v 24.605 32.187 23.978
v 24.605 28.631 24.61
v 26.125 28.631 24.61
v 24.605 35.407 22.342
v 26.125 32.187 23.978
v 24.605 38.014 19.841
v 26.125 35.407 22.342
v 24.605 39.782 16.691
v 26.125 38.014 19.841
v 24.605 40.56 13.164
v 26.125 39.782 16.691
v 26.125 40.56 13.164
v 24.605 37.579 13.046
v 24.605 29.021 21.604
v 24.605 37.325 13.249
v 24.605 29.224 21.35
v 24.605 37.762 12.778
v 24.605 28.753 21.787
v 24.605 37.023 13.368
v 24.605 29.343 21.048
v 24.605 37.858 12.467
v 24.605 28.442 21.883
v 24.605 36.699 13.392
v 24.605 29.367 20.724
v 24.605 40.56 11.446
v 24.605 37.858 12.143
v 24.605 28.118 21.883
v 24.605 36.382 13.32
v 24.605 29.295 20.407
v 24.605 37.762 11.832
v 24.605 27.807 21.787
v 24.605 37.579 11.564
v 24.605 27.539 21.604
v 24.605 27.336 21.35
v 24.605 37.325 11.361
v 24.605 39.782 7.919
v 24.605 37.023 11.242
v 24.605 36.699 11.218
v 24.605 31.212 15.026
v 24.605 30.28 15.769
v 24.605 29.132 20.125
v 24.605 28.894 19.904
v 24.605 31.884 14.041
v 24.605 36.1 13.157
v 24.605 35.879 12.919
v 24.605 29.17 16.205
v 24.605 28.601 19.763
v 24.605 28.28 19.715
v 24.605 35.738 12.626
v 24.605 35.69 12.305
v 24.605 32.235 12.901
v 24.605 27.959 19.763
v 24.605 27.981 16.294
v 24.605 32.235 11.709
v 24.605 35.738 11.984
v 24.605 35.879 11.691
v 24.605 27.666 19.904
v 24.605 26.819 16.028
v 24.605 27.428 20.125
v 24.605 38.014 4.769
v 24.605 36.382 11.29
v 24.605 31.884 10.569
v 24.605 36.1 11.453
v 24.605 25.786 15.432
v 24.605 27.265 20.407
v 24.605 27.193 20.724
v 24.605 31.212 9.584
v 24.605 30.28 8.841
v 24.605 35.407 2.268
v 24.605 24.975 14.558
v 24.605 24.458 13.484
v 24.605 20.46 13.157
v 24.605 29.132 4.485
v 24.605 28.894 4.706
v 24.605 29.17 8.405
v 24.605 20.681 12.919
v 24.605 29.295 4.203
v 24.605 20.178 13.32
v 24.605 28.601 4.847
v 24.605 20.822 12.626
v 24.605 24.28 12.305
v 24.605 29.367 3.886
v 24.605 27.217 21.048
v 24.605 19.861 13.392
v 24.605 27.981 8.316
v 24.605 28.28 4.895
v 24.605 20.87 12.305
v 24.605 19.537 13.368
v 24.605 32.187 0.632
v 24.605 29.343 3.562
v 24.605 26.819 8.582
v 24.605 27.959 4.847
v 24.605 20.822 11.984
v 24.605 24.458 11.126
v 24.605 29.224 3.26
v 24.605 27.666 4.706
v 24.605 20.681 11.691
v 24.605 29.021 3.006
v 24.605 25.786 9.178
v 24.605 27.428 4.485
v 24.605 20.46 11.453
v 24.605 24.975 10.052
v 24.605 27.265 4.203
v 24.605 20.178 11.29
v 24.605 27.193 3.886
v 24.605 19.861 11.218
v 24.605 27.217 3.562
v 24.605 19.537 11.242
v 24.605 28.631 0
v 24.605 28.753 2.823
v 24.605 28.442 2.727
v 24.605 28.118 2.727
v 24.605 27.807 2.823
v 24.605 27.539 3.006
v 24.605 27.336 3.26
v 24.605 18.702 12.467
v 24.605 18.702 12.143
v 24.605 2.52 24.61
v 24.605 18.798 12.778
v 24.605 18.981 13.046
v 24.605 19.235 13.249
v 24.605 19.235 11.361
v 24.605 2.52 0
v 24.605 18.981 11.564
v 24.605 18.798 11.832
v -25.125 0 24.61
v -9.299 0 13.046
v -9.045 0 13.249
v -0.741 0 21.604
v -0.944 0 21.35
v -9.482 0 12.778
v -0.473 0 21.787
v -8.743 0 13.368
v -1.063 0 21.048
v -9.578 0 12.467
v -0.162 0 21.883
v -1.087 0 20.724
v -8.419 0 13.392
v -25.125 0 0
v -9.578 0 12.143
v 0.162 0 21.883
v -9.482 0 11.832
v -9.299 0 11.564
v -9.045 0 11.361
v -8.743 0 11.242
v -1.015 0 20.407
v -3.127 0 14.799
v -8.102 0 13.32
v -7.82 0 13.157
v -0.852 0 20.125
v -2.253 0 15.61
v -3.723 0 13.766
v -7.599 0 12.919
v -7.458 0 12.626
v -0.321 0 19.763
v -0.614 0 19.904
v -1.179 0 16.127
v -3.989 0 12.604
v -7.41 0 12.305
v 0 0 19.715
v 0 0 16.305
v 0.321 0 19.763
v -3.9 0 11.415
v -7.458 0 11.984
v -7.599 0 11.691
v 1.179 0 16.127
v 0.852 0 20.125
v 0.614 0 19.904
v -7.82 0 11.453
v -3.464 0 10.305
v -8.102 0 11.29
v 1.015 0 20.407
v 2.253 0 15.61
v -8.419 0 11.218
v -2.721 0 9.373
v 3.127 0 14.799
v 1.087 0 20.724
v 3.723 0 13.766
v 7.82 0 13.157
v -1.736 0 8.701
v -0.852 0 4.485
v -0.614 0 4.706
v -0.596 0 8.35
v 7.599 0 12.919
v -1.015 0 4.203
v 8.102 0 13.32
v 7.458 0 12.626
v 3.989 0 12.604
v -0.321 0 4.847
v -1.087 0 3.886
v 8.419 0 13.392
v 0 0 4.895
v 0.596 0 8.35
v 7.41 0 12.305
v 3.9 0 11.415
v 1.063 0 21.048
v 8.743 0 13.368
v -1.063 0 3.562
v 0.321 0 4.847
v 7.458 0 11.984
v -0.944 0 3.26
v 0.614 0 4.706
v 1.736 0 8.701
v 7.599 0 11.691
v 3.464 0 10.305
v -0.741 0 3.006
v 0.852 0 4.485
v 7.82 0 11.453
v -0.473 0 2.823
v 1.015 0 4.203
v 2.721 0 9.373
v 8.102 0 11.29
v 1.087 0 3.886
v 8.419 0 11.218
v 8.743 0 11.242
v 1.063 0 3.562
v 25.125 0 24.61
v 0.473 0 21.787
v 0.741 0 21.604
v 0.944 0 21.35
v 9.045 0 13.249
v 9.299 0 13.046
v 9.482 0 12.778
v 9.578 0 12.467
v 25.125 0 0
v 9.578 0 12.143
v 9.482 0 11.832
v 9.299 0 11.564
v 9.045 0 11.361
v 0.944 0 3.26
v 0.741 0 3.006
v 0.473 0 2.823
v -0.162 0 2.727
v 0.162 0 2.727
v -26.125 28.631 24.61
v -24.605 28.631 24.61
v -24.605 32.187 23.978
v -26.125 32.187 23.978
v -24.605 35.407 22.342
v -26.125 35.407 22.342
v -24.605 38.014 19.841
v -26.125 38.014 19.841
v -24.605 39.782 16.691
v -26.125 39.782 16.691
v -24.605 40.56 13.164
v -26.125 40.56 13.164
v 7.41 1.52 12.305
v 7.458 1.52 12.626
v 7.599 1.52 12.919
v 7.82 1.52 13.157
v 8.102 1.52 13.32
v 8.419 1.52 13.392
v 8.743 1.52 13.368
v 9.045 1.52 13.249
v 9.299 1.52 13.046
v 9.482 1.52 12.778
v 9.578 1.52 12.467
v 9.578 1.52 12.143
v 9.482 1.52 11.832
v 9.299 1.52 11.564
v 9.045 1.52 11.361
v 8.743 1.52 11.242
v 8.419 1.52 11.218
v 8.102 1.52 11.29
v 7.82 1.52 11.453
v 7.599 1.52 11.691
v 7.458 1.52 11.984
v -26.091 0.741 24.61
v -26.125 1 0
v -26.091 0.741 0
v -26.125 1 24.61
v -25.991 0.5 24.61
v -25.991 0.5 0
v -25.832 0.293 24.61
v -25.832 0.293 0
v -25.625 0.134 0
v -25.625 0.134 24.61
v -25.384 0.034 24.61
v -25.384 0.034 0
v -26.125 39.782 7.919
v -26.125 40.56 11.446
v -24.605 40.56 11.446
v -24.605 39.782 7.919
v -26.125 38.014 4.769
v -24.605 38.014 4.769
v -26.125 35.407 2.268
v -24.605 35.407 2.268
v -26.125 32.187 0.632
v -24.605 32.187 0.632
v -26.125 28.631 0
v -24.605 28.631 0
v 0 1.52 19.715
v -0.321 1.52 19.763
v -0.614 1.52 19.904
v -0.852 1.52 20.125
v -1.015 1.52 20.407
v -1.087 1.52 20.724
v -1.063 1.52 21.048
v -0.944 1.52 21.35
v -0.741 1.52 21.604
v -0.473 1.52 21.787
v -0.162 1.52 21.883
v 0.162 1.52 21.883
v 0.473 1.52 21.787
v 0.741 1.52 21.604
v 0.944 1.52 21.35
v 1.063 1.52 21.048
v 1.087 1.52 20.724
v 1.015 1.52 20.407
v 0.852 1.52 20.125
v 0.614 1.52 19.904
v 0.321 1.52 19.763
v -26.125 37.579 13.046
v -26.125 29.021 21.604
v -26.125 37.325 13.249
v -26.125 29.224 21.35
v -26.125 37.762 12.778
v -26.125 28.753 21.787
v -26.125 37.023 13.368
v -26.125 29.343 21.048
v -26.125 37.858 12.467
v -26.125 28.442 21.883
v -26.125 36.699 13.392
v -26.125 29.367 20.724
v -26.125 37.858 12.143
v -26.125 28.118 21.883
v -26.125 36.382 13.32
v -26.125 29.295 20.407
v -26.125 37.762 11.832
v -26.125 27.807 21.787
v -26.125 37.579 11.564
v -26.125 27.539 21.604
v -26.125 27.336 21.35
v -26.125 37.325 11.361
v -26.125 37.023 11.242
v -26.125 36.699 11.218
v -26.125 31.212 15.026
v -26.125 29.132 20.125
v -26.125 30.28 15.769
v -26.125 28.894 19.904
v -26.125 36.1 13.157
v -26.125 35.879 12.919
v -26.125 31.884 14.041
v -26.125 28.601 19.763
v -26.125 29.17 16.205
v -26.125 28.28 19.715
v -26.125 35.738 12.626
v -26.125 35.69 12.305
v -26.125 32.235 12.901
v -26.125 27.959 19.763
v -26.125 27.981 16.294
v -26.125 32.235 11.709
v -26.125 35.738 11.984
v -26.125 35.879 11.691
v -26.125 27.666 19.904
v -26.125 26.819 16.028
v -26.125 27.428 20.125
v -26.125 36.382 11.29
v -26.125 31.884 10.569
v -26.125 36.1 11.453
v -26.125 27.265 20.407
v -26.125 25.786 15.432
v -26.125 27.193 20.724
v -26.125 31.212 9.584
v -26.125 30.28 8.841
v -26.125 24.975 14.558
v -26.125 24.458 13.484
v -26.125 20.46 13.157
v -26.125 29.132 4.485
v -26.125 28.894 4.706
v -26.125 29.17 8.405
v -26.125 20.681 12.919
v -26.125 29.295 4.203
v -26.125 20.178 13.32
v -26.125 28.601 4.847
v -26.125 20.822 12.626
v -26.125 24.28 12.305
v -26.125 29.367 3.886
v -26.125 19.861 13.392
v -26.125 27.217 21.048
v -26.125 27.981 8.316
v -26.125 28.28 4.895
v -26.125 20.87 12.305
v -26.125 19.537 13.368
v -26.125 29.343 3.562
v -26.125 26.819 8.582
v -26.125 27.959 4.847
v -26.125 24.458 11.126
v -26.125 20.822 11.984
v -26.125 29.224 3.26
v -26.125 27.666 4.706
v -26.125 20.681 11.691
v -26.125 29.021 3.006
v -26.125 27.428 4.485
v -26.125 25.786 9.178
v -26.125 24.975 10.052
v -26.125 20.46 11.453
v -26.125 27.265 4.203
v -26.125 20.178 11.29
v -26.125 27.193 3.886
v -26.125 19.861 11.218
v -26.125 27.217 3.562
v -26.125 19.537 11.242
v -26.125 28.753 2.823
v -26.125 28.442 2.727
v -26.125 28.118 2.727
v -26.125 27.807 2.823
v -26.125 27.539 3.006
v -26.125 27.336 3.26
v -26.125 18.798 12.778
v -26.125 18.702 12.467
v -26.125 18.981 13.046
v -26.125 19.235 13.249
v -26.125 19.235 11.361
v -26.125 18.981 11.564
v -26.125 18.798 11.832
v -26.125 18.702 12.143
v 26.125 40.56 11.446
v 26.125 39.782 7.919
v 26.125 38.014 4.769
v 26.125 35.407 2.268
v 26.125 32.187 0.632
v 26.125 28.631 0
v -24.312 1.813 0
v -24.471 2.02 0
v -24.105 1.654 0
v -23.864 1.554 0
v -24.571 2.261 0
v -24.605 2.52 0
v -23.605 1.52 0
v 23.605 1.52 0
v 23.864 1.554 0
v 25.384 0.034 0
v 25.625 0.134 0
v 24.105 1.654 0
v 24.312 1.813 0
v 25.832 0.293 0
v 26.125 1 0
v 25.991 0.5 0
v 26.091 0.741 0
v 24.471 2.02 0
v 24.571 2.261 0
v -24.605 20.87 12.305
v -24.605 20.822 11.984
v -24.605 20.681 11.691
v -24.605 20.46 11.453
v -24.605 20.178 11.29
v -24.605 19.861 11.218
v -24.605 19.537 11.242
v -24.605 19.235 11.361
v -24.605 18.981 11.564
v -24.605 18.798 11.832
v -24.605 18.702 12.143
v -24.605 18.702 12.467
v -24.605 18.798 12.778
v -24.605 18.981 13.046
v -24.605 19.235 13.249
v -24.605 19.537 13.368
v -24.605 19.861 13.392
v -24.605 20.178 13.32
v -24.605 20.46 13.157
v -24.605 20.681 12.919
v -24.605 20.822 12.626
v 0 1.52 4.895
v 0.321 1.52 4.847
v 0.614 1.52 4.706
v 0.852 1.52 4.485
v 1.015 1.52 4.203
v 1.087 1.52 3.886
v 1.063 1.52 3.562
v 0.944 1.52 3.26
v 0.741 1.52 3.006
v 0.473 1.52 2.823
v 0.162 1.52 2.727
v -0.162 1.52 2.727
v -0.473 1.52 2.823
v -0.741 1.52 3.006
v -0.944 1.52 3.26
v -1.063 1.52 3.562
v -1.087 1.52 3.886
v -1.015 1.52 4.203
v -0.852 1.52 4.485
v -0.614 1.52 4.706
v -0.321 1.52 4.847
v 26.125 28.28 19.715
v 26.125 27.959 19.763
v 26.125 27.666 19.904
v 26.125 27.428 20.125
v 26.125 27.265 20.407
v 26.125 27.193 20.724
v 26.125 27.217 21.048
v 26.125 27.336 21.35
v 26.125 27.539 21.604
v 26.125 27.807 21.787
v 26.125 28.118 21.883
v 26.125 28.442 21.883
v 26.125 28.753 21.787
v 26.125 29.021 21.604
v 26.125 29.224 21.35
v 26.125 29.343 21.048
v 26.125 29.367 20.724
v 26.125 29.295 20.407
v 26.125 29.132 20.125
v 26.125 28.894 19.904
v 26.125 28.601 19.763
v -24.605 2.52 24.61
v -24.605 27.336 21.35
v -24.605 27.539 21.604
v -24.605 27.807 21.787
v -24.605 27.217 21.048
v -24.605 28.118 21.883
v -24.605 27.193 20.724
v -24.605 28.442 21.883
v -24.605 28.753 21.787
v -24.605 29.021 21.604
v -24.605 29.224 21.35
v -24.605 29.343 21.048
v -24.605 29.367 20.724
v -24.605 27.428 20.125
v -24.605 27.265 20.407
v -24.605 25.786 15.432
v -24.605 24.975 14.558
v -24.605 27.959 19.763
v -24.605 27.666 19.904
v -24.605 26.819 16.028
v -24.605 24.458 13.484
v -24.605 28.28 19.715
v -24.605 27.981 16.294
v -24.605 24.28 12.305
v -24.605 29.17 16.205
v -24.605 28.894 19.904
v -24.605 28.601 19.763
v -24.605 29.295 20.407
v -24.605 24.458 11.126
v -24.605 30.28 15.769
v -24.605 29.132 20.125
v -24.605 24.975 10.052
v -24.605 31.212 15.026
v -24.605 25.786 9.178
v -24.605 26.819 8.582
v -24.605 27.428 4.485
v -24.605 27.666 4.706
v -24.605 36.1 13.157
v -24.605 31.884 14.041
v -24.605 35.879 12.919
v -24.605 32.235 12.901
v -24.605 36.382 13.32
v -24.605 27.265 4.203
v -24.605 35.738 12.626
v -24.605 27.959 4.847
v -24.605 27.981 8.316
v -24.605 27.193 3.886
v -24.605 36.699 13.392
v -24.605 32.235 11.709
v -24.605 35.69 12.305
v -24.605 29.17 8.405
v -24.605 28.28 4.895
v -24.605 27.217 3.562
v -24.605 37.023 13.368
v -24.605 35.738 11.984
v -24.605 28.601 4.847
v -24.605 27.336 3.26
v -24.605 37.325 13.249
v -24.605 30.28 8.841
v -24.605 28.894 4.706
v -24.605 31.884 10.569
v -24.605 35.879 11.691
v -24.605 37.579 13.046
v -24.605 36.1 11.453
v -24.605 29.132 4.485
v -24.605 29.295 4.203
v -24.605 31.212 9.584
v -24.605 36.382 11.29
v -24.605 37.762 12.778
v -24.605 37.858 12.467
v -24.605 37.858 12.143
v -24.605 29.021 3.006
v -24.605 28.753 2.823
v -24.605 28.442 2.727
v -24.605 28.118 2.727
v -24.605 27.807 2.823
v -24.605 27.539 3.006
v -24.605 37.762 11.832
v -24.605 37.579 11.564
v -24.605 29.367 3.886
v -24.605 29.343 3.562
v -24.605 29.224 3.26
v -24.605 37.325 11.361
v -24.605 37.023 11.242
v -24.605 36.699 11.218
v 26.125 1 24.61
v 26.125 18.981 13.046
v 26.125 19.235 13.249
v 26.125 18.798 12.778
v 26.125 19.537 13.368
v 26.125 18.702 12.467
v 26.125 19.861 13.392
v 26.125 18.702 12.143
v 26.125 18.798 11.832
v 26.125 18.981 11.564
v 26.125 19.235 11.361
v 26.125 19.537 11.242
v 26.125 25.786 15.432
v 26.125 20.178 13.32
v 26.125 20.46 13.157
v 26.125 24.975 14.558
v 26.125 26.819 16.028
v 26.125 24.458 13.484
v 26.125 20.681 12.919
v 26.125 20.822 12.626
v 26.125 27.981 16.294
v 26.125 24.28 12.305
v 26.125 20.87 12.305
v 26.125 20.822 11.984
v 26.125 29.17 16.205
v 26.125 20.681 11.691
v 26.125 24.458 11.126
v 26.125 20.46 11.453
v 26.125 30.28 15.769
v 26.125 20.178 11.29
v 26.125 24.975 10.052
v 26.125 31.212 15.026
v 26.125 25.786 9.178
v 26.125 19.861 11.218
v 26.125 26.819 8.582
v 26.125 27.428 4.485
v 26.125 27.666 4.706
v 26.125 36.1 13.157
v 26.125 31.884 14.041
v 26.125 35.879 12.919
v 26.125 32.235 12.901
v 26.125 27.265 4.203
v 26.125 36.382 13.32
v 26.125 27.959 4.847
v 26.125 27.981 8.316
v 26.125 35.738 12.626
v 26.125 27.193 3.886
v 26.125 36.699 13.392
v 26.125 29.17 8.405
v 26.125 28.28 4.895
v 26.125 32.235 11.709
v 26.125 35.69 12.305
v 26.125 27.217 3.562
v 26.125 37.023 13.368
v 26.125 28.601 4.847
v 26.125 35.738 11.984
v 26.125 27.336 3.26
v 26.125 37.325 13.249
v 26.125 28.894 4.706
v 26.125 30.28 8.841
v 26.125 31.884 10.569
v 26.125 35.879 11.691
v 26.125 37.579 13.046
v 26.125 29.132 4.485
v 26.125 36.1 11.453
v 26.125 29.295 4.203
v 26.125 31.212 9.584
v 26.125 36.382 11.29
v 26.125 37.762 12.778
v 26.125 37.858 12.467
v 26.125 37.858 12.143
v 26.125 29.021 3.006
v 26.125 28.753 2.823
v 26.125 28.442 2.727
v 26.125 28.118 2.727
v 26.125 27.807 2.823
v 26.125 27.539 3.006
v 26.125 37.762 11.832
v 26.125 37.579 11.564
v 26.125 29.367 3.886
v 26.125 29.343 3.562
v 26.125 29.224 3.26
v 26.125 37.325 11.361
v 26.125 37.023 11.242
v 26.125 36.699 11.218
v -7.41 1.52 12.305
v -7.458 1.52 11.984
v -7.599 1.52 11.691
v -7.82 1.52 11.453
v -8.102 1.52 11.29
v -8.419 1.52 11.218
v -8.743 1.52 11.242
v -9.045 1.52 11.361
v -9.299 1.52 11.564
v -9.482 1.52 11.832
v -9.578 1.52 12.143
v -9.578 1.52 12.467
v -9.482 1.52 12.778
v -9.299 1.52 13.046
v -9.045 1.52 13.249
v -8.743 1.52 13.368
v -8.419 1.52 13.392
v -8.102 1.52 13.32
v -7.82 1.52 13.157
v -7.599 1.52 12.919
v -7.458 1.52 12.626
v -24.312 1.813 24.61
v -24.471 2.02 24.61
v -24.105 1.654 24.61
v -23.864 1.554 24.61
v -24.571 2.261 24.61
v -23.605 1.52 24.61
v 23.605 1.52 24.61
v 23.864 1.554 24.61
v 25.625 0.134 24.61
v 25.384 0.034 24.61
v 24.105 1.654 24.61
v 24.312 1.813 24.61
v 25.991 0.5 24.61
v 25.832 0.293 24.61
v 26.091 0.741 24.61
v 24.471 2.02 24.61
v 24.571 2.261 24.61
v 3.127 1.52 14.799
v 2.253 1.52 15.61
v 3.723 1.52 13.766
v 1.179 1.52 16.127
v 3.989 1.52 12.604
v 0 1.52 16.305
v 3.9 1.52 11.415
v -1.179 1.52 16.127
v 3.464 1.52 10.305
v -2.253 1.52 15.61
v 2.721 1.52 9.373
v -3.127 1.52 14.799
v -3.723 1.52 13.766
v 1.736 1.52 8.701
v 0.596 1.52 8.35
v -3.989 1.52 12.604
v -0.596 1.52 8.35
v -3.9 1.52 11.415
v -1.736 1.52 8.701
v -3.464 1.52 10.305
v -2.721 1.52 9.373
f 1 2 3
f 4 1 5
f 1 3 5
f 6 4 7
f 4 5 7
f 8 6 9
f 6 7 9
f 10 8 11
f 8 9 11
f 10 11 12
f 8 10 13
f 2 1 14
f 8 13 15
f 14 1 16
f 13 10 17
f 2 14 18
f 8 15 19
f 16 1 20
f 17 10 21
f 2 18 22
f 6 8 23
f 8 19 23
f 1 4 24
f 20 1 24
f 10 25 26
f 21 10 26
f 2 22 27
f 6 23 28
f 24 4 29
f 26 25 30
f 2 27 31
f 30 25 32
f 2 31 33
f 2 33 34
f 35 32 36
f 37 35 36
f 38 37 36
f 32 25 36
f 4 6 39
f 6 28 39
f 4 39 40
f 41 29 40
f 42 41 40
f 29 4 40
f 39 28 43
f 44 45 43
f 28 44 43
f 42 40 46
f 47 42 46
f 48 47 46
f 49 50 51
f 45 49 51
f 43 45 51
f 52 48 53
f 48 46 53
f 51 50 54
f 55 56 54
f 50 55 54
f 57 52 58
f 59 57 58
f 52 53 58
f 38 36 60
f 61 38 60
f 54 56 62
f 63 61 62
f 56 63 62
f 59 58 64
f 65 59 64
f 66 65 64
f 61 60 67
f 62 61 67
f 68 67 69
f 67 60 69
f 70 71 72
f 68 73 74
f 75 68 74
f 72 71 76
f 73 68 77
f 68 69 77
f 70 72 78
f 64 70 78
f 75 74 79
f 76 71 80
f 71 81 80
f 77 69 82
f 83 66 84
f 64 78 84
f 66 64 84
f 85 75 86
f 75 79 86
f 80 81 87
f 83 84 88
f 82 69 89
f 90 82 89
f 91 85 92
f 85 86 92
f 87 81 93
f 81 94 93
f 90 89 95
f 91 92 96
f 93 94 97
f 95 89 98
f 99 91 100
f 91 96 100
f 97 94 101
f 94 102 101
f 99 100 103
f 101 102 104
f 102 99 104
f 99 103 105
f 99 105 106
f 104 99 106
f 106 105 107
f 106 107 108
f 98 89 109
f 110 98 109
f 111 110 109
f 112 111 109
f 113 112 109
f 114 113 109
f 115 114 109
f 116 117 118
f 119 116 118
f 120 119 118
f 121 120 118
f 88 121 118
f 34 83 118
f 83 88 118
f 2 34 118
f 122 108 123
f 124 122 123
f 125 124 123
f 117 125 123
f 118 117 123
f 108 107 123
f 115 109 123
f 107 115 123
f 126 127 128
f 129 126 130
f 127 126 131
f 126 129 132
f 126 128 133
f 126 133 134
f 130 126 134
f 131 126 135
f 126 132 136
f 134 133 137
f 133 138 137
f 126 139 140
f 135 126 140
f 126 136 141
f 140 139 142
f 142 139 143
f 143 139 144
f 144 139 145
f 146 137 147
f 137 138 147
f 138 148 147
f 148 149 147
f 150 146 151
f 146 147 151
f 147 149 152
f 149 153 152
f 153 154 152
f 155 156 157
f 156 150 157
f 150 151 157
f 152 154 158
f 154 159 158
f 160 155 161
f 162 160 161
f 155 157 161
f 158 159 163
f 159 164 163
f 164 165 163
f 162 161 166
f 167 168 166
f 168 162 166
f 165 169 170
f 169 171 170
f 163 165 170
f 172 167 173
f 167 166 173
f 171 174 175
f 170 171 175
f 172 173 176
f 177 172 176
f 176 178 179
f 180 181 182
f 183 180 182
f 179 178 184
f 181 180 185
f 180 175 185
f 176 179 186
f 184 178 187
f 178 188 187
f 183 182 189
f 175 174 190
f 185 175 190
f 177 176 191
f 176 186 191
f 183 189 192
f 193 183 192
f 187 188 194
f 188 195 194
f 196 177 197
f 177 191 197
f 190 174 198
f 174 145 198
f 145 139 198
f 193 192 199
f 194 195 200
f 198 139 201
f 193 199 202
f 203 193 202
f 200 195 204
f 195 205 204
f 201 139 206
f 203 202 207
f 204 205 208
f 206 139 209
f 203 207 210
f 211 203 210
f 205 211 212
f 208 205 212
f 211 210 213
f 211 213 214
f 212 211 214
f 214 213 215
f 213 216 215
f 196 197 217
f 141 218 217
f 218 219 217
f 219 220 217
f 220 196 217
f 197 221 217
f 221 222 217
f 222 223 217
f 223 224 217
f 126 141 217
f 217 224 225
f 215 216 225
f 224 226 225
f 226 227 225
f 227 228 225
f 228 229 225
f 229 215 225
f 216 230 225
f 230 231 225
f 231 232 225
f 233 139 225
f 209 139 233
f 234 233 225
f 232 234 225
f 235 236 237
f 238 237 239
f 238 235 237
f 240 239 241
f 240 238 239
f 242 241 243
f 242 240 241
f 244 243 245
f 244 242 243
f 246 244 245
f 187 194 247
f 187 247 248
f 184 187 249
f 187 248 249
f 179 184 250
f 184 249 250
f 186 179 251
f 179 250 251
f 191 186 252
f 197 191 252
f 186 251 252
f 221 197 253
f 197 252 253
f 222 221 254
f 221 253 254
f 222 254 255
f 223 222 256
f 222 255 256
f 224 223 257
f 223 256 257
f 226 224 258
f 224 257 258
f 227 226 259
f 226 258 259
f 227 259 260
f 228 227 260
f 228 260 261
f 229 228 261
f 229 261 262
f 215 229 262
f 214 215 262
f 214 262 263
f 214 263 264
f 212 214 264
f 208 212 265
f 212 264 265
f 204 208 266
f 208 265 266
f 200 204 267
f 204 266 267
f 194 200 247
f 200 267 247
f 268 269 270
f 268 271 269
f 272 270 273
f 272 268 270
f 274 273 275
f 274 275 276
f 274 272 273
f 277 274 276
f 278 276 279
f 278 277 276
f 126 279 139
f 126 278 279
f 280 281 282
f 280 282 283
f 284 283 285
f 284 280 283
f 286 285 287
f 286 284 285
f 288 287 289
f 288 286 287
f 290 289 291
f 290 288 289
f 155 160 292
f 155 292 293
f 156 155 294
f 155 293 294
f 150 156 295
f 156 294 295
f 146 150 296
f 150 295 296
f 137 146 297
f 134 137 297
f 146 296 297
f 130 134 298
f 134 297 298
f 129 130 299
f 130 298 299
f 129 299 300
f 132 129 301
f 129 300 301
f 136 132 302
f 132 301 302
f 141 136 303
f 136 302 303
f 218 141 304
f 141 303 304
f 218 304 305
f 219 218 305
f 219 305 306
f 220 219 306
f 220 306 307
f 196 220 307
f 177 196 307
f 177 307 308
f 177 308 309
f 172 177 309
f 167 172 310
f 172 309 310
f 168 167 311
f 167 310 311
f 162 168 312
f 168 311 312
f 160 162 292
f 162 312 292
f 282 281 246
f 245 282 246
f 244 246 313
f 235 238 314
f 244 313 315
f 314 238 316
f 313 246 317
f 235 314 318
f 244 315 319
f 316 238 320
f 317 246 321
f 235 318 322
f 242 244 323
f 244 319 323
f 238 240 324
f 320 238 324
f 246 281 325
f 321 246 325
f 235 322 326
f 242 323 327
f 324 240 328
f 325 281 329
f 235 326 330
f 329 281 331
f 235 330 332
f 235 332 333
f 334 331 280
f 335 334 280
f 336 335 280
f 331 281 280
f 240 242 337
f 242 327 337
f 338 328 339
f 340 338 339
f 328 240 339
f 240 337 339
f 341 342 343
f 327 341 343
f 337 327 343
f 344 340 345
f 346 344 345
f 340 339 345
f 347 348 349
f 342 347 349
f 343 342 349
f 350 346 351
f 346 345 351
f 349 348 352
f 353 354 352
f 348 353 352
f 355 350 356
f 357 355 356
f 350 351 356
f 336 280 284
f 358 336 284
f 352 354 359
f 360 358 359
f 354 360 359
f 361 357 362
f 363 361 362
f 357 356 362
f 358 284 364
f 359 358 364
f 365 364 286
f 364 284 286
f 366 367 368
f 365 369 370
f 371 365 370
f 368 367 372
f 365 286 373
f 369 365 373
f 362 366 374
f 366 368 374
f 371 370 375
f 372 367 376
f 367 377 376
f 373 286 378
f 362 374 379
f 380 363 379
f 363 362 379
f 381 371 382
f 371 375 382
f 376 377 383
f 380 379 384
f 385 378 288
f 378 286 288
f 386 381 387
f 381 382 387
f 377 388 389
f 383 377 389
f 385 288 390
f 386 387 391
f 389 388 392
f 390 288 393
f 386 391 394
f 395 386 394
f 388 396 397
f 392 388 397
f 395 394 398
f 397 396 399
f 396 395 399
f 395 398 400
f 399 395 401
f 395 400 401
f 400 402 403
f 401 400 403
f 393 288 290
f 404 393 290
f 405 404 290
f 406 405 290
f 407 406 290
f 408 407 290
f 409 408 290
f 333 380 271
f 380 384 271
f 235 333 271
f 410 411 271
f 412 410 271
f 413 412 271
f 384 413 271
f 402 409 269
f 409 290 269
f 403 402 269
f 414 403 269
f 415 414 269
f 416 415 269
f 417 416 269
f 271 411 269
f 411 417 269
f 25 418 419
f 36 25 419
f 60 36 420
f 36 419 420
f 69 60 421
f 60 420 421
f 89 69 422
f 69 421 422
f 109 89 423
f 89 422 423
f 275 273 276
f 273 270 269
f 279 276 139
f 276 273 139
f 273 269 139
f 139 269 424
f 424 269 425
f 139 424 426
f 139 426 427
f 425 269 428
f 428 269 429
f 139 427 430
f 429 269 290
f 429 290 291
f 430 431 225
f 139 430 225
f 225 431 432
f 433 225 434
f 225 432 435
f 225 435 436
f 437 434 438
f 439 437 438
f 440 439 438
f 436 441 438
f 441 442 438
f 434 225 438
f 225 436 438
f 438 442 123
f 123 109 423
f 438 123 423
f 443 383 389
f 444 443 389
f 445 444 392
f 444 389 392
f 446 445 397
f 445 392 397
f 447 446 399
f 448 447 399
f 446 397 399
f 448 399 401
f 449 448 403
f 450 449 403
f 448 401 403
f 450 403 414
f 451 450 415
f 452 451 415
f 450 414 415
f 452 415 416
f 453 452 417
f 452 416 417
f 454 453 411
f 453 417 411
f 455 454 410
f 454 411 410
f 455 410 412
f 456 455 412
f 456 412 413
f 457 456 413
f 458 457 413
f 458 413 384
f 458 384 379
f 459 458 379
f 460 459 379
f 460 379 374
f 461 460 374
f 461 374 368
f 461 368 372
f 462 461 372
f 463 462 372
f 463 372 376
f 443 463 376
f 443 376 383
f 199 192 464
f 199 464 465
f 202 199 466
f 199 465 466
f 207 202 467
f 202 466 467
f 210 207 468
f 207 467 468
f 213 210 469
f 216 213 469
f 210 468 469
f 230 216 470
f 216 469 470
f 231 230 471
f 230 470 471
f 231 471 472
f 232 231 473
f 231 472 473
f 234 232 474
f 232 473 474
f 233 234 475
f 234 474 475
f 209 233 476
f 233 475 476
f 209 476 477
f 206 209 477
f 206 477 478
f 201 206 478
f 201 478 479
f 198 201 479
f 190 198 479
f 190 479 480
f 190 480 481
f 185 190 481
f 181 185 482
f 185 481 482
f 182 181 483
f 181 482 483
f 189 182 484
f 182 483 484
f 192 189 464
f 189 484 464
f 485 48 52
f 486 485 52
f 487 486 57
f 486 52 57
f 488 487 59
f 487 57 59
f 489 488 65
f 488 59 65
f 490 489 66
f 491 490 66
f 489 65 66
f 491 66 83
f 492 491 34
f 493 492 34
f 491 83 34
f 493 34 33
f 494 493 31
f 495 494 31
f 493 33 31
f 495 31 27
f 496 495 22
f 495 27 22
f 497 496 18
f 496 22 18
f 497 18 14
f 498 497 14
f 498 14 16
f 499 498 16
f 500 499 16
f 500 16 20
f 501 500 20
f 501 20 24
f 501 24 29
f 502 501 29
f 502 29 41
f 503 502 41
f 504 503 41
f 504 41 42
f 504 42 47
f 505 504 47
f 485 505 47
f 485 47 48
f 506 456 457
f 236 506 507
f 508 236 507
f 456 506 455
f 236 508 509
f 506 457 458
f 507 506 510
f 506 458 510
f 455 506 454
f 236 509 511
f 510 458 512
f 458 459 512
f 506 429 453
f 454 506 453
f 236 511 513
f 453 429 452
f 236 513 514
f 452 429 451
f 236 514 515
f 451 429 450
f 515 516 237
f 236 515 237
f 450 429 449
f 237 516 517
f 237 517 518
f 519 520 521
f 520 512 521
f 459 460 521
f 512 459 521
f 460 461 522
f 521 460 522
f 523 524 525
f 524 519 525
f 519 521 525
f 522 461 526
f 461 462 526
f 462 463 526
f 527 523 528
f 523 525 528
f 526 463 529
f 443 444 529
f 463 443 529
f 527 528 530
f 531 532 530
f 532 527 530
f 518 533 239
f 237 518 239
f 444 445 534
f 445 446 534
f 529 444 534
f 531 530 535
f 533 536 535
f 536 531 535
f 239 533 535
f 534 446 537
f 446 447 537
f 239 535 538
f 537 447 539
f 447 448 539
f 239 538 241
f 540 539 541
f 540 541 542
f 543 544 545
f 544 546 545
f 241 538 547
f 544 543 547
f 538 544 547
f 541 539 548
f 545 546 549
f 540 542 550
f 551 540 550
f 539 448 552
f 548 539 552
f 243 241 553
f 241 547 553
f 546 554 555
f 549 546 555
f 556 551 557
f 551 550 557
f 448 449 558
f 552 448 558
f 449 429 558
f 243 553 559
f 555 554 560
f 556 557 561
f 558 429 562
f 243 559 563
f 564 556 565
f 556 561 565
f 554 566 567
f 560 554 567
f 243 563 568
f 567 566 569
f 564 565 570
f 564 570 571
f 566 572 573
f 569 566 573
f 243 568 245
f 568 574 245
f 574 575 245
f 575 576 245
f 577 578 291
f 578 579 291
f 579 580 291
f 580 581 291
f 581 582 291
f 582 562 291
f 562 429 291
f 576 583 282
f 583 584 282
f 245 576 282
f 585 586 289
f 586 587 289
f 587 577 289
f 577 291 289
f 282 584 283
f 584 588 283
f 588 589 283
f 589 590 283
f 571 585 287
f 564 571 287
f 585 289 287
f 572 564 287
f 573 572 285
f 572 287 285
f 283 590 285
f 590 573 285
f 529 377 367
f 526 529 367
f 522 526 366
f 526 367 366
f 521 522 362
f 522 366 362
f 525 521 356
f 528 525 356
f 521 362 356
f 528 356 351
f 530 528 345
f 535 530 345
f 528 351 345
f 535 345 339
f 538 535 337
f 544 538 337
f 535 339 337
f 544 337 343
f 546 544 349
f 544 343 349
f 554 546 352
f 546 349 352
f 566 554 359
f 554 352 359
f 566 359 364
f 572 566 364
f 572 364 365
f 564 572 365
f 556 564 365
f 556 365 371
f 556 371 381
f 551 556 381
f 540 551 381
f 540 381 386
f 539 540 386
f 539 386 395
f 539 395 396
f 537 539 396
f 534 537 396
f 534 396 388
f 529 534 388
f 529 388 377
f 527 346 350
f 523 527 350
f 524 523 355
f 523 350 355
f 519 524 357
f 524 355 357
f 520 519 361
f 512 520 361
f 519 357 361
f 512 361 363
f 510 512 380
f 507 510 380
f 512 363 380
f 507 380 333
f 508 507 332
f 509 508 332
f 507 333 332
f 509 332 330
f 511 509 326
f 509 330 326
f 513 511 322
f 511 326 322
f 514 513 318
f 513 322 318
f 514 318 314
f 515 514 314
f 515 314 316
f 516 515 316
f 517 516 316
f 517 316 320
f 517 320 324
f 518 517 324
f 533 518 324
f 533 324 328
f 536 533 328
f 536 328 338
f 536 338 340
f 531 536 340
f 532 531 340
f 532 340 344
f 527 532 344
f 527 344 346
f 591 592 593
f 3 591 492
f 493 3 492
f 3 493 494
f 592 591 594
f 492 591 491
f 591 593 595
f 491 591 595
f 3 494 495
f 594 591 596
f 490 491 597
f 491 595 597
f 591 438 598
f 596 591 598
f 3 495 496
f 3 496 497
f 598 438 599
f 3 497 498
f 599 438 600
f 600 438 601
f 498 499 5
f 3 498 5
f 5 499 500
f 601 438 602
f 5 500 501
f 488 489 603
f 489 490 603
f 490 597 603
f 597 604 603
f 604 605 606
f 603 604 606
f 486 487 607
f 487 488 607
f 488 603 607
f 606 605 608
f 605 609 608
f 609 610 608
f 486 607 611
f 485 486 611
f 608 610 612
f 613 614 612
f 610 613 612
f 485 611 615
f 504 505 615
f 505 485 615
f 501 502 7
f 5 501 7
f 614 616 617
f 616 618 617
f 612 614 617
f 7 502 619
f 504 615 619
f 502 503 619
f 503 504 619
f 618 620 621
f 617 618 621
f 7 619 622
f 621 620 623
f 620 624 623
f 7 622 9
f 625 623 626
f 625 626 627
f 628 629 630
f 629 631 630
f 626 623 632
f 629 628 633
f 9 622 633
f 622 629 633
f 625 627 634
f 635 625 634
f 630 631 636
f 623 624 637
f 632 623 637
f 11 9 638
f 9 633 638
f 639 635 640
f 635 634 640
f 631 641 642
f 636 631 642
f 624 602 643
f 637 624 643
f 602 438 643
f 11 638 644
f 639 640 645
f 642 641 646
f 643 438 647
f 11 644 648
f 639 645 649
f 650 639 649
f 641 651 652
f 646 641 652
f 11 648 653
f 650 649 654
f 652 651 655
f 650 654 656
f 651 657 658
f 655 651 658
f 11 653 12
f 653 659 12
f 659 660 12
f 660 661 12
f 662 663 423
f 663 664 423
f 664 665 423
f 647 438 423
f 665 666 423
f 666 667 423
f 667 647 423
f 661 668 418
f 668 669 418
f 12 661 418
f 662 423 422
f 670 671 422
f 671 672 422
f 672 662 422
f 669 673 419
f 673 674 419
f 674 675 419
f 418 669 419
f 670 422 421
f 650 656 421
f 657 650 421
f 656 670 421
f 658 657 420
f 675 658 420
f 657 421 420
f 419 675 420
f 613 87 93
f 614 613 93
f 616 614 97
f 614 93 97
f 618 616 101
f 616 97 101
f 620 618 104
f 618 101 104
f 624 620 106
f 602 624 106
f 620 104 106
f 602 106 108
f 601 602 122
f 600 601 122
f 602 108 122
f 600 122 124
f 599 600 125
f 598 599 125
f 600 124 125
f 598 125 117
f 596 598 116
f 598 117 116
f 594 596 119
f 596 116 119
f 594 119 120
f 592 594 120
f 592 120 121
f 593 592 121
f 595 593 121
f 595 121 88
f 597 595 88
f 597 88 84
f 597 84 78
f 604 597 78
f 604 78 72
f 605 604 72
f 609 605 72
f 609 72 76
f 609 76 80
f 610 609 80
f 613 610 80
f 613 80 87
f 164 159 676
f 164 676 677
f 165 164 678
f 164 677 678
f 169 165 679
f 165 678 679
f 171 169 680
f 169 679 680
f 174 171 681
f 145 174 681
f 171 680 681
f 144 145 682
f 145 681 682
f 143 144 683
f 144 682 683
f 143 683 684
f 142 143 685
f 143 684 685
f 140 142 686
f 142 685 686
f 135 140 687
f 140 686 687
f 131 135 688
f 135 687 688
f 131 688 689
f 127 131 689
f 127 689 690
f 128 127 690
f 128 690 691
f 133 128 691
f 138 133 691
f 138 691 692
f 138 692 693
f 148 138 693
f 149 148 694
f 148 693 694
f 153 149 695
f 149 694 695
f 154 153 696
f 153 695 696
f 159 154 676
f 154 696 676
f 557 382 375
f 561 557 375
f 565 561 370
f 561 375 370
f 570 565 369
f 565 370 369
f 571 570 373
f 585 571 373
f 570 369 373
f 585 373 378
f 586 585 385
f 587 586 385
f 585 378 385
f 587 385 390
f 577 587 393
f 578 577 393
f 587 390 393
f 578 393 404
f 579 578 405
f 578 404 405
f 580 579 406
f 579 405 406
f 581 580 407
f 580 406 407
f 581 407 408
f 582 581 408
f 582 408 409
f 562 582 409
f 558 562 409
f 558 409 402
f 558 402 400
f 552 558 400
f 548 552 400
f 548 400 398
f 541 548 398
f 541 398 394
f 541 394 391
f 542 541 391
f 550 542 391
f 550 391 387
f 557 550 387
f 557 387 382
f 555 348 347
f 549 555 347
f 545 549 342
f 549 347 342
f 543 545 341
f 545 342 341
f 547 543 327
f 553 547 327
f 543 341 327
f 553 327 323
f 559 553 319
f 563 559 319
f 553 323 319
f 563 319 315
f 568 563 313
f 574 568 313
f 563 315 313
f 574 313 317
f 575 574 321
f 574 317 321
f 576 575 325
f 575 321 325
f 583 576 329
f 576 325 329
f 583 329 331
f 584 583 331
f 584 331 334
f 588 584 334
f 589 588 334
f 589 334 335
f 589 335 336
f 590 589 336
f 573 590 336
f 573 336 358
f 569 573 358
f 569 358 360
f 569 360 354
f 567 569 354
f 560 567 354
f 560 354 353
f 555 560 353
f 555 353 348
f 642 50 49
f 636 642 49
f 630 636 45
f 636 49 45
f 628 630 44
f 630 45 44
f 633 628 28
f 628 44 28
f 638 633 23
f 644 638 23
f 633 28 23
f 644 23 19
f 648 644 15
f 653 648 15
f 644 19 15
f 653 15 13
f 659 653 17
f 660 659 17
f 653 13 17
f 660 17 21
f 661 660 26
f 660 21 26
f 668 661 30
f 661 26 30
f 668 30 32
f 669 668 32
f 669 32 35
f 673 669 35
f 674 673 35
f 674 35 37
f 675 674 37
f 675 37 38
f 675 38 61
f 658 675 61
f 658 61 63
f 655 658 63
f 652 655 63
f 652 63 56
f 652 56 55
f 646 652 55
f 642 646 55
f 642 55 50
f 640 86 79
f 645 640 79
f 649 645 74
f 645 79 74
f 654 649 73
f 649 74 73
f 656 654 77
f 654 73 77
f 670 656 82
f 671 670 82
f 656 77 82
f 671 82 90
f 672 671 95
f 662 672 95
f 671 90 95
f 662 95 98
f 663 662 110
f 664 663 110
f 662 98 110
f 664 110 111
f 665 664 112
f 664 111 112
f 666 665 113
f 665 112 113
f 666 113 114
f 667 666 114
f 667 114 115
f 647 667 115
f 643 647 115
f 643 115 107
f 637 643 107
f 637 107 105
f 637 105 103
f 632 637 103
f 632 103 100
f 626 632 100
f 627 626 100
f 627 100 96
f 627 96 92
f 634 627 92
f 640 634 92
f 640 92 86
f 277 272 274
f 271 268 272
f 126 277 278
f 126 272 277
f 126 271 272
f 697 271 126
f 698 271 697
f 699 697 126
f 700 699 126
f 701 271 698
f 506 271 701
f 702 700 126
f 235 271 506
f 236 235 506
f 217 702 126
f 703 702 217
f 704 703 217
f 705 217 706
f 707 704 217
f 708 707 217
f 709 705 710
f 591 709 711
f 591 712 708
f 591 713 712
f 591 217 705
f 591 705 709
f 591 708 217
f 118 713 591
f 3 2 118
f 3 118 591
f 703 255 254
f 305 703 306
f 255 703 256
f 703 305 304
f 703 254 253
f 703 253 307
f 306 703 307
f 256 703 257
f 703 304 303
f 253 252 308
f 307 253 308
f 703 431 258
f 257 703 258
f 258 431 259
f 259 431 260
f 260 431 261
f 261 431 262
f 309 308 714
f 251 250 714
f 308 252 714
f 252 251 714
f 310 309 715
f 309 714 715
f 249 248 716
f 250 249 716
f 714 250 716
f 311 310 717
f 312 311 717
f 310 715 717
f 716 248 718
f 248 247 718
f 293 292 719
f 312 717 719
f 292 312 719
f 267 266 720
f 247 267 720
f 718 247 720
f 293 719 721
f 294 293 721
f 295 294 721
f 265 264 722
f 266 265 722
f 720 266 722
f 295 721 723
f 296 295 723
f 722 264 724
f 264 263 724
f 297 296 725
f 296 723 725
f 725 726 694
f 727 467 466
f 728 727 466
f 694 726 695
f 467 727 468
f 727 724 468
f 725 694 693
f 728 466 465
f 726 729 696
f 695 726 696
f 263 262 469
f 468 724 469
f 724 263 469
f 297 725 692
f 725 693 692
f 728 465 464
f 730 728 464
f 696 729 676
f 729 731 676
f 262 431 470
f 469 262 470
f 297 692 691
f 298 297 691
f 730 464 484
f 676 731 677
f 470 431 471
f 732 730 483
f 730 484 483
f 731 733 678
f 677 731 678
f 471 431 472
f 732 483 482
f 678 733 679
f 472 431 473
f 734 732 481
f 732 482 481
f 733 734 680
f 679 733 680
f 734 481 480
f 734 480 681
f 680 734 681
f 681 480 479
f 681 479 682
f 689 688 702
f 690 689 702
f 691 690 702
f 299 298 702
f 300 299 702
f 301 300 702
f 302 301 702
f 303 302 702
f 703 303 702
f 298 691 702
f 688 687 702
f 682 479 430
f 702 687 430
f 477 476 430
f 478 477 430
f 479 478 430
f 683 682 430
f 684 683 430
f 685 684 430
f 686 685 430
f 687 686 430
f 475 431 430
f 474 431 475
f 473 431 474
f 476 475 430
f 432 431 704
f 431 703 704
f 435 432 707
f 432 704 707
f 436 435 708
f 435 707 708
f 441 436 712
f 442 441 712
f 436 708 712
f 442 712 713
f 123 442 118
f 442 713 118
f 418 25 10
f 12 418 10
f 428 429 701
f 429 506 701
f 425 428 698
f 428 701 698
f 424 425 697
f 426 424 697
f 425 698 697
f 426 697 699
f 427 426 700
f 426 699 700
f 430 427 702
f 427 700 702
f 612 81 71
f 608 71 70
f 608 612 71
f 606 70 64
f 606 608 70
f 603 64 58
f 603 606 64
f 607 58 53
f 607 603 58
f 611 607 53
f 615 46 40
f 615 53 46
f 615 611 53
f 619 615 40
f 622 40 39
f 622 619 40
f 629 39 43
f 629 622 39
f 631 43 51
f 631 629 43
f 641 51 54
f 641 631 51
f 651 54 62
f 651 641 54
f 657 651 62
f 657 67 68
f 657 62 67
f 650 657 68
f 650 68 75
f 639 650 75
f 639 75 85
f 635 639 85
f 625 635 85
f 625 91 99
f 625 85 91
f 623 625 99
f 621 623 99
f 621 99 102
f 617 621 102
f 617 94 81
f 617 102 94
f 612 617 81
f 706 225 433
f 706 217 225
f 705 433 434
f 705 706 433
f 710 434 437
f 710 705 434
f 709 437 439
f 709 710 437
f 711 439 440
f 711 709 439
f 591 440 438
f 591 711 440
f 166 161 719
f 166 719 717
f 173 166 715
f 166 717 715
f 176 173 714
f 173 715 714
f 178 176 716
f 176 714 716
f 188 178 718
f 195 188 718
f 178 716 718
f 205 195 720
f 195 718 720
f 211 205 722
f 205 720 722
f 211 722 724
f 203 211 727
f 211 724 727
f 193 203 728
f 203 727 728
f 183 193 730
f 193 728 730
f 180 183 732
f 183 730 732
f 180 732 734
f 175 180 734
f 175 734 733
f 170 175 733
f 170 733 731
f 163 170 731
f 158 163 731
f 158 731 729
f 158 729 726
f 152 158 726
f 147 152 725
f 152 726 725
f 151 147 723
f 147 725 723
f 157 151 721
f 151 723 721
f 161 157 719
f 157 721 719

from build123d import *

# Parameters (mm, degrees)
BOSS_EXTRUDE1_DEPTH = 24.61
SKETCH2_R           = 4
CUT_EXTRUDE5_DEPTH  = 20
SKETCH4_R           = 1.09
CUT_EXTRUDE6_DEPTH  = 100
CIRPATTERN1_COUNT   = 4
SKETCH5_R           = 4
CUT_EXTRUDE7_DEPTH  = 50
SKETCH6_R           = 1.09
CUT_EXTRUDE8_DEPTH  = 50
CIRPATTERN2_COUNT   = 4
FILLET1_R           = 1
SKETCH7_W           = 24.61
SKETCH7_H           = 17.78
CUT_EXTRUDE9_DEPTH  = 100


with BuildPart() as part:
    # Sketch1 → Boss-Extrude1 (new body)
    with BuildSketch(Plane.XY):
        Polygon((-26.125, 58.34), (-26.125, 0), (26.125, 0), (26.125, 58.34), (24.605, 58.34), (24.605, 1.52), (-24.605, 1.52), (-24.605, 58.34), align=None)
    extrude(amount=BOSS_EXTRUDE1_DEPTH)

    # Sketch2 → Cut-Extrude5 (cut)
    with BuildSketch(Plane.ZY.offset(26.125)):
        with Locations(Location((12.305, 28.28, 0), (0, 0, 270))):
            Circle(SKETCH2_R)
        with BuildLine():
            Line((-0.005, 28.28), (-0.002957418, 40.56))
            Line((-0.002957418, 40.56), (11.446105362, 40.56))
            ThreePointArc((11.446105362, 40.56), (3.301970149, 36.675329267), (-0.005, 28.28))
        make_face()
        with BuildLine():
            Line((24.612957418, 40.56), (24.615, 28.28))
            ThreePointArc((24.615, 28.28), (21.308029851, 36.675329267), (13.163894638, 40.56))
            Line((13.163894638, 40.56), (24.612957418, 40.56))
        make_face()
    cut_extrude5 = extrude(amount=-CUT_EXTRUDE5_DEPTH, mode=Mode.SUBTRACT)

    # Mirror1: Cut-Extrude5 across plane
    add(cut_extrude5.mirror(Plane(origin=(0, 0, 0), x_dir=(0, 0, 1), z_dir=(1, 0, 0))), mode=Mode.SUBTRACT)

    # Sketch4 → Cut-Extrude6 (cut)
    with BuildSketch(Plane.ZY.offset(26.125)):
        with Locations(Location((12.305, 36.78, 0), (0, 0, 270))):
            Circle(SKETCH4_R)
    cut_extrude6 = extrude(amount=-CUT_EXTRUDE6_DEPTH, mode=Mode.SUBTRACT)

    # CirPattern1: Cut-Extrude6 ×4 about axis
    cirpattern1_axis = Axis((0, 28.28, 12.305), (1, 0, 0))
    for i in range(1, CIRPATTERN1_COUNT):
        add(cut_extrude6.rotate(cirpattern1_axis, i * 360 / CIRPATTERN1_COUNT), mode=Mode.SUBTRACT)

    # Sketch5 → Cut-Extrude7 (cut, symmetric)
    with BuildSketch(Plane(origin=(0, 1.52, 0), x_dir=(1, 0, 0), z_dir=(0, 1, 0))):
        with Locations(Location((0, -12.305, 0), (0, 0, 270))):
            Circle(SKETCH5_R)
    extrude(amount=CUT_EXTRUDE7_DEPTH, both=True, mode=Mode.SUBTRACT)

    # Sketch6 → Cut-Extrude8 (cut, symmetric)
    with BuildSketch(Plane(origin=(0, 1.52, 0), x_dir=(1, 0, 0), z_dir=(0, 1, 0))):
        with Locations(Location((0, -3.805, 0), (0, 0, 270))):
            Circle(SKETCH6_R)
    cut_extrude8 = extrude(amount=CUT_EXTRUDE8_DEPTH, both=True, mode=Mode.SUBTRACT)

    # CirPattern2: Cut-Extrude8 ×4 about axis
    cirpattern2_axis = Axis((0, 0, 12.305), (0, 1, 0))
    for i in range(1, CIRPATTERN2_COUNT):
        add(cut_extrude8.rotate(cirpattern2_axis, i * 360 / CIRPATTERN2_COUNT), mode=Mode.SUBTRACT)

    # Fillet1
    fillet1_edges = [part.edges().sort_by_distance(p)[0] for p in [
        (-24.605, 1.52, 12.305),
        (24.605, 1.52, 12.305),
        (26.125, 0, 12.305),
        (-26.125, 0, 12.305),
    ]]
    fillet(fillet1_edges, radius=FILLET1_R)

    # Sketch7 → Cut-Extrude9 (cut)
    with BuildSketch(Plane.ZY.offset(26.125)):
        with Locations((12.305, 49.45)):
            Rectangle(SKETCH7_W, SKETCH7_H)
    extrude(amount=-CUT_EXTRUDE9_DEPTH, mode=Mode.SUBTRACT)


solid = part.part
